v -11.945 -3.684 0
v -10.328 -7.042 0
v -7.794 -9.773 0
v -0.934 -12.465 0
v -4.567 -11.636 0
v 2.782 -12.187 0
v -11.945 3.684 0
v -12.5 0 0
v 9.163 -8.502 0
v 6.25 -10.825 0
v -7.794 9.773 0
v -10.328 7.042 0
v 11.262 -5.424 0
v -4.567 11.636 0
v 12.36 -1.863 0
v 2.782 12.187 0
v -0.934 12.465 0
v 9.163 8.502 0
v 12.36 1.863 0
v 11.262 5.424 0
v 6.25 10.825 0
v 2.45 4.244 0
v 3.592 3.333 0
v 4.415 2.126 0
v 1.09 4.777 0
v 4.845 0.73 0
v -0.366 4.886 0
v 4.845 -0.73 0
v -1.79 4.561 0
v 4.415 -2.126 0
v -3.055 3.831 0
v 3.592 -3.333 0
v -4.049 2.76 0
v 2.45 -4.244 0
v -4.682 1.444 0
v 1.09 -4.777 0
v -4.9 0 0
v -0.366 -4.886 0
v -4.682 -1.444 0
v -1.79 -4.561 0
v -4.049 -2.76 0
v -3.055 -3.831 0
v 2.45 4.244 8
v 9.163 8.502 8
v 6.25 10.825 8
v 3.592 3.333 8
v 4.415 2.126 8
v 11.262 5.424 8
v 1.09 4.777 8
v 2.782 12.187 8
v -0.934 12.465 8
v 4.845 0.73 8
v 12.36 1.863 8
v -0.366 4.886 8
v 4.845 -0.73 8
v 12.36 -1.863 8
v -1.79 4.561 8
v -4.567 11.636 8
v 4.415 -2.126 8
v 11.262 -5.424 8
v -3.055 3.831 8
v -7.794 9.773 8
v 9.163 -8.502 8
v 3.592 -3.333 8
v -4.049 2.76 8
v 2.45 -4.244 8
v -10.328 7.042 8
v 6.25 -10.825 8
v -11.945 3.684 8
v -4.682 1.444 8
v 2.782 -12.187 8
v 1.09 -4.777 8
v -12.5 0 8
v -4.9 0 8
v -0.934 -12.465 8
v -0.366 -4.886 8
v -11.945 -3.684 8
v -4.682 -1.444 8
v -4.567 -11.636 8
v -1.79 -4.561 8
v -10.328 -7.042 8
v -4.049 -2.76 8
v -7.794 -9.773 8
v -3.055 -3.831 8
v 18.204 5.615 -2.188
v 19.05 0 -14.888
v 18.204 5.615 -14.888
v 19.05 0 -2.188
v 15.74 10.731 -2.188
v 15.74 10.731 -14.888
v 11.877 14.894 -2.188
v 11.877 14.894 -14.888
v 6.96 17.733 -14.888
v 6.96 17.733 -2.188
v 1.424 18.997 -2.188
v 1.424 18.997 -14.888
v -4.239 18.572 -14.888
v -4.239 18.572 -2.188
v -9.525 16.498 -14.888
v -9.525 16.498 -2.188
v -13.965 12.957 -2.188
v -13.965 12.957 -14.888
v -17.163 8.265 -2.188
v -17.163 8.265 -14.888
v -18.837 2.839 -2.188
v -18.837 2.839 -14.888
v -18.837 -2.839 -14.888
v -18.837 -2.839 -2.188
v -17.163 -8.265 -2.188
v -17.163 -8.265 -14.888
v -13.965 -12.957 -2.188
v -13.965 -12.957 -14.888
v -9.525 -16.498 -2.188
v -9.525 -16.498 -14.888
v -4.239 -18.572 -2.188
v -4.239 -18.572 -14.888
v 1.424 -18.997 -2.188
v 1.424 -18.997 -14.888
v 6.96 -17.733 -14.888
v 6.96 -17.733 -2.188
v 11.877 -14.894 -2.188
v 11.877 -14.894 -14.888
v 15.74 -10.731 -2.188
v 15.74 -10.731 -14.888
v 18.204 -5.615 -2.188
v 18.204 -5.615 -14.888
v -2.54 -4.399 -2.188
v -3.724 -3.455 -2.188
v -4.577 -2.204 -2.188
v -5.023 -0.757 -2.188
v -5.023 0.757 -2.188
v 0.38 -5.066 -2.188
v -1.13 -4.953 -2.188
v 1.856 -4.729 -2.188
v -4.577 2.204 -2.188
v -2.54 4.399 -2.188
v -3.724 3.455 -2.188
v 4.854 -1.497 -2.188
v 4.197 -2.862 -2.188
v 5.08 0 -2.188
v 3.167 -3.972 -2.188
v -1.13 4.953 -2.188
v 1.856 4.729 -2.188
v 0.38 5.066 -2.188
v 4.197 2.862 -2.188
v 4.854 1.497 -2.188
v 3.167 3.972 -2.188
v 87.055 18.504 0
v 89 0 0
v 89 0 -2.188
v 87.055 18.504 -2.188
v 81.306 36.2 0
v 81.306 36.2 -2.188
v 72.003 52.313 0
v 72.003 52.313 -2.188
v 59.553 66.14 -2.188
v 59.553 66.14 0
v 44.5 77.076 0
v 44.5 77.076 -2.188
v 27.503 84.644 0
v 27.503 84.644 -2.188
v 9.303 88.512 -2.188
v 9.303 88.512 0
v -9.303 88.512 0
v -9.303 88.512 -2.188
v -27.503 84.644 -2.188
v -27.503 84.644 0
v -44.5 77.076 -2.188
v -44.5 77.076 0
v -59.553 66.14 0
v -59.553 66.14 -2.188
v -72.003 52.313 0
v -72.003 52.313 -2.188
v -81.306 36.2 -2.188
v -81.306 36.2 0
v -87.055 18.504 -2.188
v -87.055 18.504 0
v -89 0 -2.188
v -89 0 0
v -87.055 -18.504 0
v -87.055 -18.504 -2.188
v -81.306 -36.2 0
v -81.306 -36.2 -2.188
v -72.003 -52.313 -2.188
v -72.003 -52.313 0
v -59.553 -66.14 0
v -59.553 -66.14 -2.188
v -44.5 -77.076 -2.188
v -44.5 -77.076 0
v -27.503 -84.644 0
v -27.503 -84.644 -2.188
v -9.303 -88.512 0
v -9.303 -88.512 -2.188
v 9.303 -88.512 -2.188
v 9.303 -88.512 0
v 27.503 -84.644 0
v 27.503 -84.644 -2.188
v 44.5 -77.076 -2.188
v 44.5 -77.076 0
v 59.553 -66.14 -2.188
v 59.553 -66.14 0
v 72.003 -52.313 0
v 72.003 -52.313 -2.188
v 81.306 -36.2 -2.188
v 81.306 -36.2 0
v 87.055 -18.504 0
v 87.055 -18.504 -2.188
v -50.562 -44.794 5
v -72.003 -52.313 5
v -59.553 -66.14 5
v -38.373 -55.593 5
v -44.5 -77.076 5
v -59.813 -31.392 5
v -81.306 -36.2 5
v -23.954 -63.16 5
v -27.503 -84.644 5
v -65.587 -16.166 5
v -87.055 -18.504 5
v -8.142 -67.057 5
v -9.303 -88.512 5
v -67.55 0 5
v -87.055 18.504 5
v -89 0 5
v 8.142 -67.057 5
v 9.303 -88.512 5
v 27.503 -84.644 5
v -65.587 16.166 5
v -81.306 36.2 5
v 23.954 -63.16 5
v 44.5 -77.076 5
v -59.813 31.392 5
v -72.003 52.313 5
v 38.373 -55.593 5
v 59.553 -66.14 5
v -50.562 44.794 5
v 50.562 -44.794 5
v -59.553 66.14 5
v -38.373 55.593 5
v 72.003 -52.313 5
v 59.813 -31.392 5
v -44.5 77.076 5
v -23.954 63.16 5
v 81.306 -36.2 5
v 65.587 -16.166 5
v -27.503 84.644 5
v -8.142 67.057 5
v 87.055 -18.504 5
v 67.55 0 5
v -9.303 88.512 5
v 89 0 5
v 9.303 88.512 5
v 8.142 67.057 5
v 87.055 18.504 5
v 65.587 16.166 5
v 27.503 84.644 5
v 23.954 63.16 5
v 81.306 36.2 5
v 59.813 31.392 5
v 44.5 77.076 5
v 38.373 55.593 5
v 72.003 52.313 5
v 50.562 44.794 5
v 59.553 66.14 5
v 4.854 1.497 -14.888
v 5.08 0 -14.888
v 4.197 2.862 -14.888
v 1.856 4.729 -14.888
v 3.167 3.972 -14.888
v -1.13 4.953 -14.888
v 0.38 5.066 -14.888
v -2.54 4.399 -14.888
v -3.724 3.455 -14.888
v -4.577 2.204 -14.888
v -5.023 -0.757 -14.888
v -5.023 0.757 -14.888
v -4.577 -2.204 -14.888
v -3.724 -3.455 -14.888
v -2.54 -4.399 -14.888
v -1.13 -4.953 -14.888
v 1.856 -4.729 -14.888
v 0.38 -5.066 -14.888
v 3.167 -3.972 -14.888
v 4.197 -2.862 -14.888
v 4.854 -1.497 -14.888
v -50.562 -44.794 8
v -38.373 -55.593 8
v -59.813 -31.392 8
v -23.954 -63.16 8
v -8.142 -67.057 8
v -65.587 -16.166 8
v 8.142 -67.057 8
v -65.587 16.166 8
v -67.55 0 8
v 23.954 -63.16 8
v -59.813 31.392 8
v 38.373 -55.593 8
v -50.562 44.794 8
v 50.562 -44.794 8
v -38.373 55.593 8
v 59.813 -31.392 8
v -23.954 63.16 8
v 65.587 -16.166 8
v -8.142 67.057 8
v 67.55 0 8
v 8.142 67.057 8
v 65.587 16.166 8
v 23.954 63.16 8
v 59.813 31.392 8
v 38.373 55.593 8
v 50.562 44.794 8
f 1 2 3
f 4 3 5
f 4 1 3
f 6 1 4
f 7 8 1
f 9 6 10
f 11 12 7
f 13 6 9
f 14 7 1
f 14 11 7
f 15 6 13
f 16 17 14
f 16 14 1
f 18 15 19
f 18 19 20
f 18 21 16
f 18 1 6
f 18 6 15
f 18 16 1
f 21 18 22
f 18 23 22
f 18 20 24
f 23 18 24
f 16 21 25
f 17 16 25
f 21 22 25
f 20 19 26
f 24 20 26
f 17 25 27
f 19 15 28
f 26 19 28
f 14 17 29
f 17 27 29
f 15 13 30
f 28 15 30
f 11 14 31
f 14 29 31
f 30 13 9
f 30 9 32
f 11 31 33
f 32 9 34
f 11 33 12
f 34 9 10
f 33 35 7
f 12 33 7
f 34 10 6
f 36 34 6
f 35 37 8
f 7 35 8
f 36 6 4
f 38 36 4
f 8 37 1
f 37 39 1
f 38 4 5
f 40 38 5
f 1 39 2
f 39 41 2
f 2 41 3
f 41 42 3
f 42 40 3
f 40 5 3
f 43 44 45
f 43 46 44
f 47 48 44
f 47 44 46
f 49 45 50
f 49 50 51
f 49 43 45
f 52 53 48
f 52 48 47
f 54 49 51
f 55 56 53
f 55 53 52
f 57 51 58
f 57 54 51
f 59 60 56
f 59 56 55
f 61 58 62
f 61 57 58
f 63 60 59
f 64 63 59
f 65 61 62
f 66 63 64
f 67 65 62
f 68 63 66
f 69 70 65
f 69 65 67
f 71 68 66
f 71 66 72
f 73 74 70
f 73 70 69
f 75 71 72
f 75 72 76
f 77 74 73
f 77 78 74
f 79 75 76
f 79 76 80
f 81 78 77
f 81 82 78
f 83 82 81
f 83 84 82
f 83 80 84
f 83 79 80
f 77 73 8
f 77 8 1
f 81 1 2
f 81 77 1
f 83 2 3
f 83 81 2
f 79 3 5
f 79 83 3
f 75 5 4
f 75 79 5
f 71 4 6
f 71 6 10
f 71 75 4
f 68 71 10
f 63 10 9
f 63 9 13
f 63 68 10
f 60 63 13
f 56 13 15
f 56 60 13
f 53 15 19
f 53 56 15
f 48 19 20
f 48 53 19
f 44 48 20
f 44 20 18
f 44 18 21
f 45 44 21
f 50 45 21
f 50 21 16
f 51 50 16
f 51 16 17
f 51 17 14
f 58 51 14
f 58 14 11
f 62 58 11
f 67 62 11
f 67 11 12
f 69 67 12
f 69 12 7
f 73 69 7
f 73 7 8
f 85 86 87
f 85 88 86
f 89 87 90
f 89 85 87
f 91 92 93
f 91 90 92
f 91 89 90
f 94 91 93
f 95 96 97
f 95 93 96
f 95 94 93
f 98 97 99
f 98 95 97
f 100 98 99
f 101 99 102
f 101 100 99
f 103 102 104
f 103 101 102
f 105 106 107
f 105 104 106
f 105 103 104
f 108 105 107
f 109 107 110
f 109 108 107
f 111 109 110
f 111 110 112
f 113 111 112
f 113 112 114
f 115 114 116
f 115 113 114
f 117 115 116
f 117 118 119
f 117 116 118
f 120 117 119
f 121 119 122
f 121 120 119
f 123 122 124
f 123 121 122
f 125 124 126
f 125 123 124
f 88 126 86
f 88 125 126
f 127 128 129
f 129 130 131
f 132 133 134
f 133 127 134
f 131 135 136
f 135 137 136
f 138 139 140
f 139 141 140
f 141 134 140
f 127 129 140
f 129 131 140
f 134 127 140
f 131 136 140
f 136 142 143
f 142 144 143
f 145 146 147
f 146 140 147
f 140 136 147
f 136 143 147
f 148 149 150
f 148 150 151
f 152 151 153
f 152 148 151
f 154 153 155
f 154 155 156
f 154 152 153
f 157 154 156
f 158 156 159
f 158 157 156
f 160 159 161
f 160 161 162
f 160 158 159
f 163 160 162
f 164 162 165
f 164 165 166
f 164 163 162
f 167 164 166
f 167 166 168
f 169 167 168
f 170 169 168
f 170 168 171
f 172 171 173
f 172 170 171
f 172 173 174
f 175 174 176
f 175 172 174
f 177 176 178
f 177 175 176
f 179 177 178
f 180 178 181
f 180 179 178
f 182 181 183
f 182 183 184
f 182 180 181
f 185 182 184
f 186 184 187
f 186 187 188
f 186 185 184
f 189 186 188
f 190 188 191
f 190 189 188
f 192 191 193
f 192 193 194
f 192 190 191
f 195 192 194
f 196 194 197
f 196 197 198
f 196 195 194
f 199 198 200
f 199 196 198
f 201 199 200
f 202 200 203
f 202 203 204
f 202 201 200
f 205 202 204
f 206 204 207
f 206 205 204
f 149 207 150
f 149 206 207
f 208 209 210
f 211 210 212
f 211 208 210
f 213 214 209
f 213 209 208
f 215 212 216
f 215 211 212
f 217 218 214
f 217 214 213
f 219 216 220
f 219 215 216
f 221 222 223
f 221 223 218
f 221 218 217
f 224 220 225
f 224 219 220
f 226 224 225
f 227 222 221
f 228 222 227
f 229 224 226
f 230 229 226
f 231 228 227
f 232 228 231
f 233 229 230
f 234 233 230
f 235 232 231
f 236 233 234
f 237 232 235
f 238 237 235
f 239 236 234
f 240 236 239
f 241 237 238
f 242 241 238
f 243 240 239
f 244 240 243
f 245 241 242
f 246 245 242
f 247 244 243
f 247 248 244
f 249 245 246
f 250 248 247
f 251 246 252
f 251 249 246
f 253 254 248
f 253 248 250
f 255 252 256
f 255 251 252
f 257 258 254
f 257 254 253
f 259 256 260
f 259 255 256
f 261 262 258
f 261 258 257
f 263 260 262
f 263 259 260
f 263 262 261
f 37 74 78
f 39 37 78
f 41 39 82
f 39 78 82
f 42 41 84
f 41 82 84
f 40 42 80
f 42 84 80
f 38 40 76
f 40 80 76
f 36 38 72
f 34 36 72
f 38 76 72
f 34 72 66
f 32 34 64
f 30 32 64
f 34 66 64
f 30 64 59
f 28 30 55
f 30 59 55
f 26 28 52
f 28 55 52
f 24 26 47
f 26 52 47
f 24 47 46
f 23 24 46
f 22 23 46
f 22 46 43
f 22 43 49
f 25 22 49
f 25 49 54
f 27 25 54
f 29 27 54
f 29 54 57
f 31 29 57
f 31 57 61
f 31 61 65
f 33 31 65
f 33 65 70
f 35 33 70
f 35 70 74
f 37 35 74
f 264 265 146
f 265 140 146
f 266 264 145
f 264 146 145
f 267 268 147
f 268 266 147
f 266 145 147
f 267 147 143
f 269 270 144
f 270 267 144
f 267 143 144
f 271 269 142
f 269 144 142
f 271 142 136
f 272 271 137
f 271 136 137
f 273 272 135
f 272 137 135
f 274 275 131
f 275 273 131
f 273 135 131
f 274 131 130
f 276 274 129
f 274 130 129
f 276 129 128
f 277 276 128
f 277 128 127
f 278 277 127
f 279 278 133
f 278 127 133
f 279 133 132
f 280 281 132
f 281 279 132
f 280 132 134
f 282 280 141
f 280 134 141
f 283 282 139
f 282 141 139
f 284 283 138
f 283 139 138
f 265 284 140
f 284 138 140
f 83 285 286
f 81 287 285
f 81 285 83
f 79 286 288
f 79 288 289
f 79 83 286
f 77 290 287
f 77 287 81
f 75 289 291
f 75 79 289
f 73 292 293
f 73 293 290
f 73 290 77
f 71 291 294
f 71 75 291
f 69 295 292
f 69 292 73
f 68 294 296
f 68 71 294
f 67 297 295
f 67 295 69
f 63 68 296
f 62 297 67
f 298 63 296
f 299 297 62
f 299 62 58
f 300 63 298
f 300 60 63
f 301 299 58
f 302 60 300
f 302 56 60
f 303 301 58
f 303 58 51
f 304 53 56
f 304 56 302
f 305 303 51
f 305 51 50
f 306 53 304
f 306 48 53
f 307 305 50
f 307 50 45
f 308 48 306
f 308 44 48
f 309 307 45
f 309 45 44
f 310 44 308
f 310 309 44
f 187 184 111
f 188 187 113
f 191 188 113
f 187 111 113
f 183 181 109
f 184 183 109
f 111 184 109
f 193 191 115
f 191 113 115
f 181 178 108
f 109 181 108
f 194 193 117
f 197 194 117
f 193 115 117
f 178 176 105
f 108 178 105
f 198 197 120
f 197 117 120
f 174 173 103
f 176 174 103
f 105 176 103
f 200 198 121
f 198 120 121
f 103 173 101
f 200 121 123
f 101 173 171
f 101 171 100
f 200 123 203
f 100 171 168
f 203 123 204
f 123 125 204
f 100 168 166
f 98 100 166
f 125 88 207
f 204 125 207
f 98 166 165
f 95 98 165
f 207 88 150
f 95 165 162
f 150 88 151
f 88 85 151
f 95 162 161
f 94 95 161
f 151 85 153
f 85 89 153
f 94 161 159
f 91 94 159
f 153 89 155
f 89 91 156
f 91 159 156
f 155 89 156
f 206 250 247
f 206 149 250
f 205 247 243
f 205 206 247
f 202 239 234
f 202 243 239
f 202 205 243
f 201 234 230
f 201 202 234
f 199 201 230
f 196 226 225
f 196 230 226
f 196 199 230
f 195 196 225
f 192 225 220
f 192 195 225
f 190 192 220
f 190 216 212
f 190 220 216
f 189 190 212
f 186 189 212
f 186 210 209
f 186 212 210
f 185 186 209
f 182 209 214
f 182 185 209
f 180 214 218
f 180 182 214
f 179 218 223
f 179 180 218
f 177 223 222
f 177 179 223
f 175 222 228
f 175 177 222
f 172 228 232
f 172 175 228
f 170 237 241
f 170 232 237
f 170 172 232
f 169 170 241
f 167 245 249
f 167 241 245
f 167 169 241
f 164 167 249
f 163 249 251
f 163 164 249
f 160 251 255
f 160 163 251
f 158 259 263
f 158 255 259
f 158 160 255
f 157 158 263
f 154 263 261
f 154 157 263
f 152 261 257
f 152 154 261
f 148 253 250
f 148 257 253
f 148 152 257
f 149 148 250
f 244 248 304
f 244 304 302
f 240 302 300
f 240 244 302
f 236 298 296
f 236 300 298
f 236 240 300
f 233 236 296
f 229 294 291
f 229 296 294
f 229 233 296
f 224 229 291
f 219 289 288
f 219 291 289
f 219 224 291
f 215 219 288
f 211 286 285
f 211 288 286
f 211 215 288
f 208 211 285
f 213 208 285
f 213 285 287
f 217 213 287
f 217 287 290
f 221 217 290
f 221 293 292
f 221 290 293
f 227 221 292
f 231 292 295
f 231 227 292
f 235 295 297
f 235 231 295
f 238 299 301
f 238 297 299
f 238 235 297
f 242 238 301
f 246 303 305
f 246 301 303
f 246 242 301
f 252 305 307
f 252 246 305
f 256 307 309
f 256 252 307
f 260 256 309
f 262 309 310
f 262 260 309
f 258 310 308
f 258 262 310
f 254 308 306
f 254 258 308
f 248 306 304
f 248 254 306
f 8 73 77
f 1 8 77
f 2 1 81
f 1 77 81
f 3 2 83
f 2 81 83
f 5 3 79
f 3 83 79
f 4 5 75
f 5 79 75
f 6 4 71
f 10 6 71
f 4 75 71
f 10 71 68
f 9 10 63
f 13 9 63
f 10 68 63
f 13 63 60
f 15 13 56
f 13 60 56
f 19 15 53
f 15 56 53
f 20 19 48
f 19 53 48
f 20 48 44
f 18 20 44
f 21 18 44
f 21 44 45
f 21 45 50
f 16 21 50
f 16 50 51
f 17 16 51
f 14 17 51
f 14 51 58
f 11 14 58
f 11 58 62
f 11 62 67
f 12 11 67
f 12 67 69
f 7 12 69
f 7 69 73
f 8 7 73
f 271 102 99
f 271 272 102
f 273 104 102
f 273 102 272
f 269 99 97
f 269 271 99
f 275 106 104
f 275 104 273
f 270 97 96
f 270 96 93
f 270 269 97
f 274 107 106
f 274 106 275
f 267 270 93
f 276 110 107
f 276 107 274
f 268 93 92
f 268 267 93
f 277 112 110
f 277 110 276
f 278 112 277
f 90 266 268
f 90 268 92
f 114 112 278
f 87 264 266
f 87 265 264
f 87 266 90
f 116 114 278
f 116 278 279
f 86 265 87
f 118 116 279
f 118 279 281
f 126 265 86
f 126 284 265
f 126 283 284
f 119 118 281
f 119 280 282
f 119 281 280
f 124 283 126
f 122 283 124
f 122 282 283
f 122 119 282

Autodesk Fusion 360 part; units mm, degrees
sketch "Sketch1" plane through (0, 0, 0) normal (0, 0, 1) x (1, 0, 0)
  circle A0 centre (0, 0) radius 89
  circle A1 centre (0, 0) radius 67.55
  dimension "d1" = 178
  dimension "d2" = 135.1
extrude "Extrude1" add sketch "Sketch1" along normal blind 8 contours A1 makes body 1
extrude "Extrude2" add sketch "Sketch1" along normal blind 5 bodies 1
sketch "Sketch2" plane through (0, 0, 8) normal (0, 0, 1) x (-1, 0, 0)
  circle A0 centre (0, 0) radius 67.55
  circle A1 centre (0, 0) radius 12.5
  circle A2 centre (0, 0) radius 4.9
  dimension "d7" = 25
  dimension "d19" = 9.8
extrude "Extrude3" cut sketch "Sketch2" against normal blind 10 contours A1 | A2 bodies 1
sketch "Sketch3" plane through (0, 0, 0) normal (0, 0, 1) x (1, 0, 0)
  circle A0 centre (0, 0) radius 4.9
  circle A1 centre (0, 0) radius 12.5
  dimension "d10" = 9.8
extrude "Extrude5" add sketch "Sketch1" against normal blind 2.1882 contours A0 | A1 bodies 1
sketch "Sketch4" plane through (0, 0, -2.1882) normal (0, 0, -1) x (1, 0, 0)
  circle A0 centre (0, 0) radius 89
  circle A1 centre (0, 0) radius 19.05
  circle A2 centre (0, 0) radius 5.08
  dimension "d15" = 38.1
  dimension "d16" = 10.16
extrude "Extrude6" add sketch "Sketch4" along normal blind 12.7 contours A1 bodies 1
sketch "Sketch5" plane through (0, 0, 8) normal (0, 0, 1) x (-1, 0, 0)
  circle A0 centre (0, 0) radius 12.5
  circle A1 centre (0, 0) radius 4.9
extrude "Extrude7" add sketch "Sketch5" against normal up to surface (8 mm away) separate body makes body 2
equation "d13 = -( 0.283 in - 5 mm )"
